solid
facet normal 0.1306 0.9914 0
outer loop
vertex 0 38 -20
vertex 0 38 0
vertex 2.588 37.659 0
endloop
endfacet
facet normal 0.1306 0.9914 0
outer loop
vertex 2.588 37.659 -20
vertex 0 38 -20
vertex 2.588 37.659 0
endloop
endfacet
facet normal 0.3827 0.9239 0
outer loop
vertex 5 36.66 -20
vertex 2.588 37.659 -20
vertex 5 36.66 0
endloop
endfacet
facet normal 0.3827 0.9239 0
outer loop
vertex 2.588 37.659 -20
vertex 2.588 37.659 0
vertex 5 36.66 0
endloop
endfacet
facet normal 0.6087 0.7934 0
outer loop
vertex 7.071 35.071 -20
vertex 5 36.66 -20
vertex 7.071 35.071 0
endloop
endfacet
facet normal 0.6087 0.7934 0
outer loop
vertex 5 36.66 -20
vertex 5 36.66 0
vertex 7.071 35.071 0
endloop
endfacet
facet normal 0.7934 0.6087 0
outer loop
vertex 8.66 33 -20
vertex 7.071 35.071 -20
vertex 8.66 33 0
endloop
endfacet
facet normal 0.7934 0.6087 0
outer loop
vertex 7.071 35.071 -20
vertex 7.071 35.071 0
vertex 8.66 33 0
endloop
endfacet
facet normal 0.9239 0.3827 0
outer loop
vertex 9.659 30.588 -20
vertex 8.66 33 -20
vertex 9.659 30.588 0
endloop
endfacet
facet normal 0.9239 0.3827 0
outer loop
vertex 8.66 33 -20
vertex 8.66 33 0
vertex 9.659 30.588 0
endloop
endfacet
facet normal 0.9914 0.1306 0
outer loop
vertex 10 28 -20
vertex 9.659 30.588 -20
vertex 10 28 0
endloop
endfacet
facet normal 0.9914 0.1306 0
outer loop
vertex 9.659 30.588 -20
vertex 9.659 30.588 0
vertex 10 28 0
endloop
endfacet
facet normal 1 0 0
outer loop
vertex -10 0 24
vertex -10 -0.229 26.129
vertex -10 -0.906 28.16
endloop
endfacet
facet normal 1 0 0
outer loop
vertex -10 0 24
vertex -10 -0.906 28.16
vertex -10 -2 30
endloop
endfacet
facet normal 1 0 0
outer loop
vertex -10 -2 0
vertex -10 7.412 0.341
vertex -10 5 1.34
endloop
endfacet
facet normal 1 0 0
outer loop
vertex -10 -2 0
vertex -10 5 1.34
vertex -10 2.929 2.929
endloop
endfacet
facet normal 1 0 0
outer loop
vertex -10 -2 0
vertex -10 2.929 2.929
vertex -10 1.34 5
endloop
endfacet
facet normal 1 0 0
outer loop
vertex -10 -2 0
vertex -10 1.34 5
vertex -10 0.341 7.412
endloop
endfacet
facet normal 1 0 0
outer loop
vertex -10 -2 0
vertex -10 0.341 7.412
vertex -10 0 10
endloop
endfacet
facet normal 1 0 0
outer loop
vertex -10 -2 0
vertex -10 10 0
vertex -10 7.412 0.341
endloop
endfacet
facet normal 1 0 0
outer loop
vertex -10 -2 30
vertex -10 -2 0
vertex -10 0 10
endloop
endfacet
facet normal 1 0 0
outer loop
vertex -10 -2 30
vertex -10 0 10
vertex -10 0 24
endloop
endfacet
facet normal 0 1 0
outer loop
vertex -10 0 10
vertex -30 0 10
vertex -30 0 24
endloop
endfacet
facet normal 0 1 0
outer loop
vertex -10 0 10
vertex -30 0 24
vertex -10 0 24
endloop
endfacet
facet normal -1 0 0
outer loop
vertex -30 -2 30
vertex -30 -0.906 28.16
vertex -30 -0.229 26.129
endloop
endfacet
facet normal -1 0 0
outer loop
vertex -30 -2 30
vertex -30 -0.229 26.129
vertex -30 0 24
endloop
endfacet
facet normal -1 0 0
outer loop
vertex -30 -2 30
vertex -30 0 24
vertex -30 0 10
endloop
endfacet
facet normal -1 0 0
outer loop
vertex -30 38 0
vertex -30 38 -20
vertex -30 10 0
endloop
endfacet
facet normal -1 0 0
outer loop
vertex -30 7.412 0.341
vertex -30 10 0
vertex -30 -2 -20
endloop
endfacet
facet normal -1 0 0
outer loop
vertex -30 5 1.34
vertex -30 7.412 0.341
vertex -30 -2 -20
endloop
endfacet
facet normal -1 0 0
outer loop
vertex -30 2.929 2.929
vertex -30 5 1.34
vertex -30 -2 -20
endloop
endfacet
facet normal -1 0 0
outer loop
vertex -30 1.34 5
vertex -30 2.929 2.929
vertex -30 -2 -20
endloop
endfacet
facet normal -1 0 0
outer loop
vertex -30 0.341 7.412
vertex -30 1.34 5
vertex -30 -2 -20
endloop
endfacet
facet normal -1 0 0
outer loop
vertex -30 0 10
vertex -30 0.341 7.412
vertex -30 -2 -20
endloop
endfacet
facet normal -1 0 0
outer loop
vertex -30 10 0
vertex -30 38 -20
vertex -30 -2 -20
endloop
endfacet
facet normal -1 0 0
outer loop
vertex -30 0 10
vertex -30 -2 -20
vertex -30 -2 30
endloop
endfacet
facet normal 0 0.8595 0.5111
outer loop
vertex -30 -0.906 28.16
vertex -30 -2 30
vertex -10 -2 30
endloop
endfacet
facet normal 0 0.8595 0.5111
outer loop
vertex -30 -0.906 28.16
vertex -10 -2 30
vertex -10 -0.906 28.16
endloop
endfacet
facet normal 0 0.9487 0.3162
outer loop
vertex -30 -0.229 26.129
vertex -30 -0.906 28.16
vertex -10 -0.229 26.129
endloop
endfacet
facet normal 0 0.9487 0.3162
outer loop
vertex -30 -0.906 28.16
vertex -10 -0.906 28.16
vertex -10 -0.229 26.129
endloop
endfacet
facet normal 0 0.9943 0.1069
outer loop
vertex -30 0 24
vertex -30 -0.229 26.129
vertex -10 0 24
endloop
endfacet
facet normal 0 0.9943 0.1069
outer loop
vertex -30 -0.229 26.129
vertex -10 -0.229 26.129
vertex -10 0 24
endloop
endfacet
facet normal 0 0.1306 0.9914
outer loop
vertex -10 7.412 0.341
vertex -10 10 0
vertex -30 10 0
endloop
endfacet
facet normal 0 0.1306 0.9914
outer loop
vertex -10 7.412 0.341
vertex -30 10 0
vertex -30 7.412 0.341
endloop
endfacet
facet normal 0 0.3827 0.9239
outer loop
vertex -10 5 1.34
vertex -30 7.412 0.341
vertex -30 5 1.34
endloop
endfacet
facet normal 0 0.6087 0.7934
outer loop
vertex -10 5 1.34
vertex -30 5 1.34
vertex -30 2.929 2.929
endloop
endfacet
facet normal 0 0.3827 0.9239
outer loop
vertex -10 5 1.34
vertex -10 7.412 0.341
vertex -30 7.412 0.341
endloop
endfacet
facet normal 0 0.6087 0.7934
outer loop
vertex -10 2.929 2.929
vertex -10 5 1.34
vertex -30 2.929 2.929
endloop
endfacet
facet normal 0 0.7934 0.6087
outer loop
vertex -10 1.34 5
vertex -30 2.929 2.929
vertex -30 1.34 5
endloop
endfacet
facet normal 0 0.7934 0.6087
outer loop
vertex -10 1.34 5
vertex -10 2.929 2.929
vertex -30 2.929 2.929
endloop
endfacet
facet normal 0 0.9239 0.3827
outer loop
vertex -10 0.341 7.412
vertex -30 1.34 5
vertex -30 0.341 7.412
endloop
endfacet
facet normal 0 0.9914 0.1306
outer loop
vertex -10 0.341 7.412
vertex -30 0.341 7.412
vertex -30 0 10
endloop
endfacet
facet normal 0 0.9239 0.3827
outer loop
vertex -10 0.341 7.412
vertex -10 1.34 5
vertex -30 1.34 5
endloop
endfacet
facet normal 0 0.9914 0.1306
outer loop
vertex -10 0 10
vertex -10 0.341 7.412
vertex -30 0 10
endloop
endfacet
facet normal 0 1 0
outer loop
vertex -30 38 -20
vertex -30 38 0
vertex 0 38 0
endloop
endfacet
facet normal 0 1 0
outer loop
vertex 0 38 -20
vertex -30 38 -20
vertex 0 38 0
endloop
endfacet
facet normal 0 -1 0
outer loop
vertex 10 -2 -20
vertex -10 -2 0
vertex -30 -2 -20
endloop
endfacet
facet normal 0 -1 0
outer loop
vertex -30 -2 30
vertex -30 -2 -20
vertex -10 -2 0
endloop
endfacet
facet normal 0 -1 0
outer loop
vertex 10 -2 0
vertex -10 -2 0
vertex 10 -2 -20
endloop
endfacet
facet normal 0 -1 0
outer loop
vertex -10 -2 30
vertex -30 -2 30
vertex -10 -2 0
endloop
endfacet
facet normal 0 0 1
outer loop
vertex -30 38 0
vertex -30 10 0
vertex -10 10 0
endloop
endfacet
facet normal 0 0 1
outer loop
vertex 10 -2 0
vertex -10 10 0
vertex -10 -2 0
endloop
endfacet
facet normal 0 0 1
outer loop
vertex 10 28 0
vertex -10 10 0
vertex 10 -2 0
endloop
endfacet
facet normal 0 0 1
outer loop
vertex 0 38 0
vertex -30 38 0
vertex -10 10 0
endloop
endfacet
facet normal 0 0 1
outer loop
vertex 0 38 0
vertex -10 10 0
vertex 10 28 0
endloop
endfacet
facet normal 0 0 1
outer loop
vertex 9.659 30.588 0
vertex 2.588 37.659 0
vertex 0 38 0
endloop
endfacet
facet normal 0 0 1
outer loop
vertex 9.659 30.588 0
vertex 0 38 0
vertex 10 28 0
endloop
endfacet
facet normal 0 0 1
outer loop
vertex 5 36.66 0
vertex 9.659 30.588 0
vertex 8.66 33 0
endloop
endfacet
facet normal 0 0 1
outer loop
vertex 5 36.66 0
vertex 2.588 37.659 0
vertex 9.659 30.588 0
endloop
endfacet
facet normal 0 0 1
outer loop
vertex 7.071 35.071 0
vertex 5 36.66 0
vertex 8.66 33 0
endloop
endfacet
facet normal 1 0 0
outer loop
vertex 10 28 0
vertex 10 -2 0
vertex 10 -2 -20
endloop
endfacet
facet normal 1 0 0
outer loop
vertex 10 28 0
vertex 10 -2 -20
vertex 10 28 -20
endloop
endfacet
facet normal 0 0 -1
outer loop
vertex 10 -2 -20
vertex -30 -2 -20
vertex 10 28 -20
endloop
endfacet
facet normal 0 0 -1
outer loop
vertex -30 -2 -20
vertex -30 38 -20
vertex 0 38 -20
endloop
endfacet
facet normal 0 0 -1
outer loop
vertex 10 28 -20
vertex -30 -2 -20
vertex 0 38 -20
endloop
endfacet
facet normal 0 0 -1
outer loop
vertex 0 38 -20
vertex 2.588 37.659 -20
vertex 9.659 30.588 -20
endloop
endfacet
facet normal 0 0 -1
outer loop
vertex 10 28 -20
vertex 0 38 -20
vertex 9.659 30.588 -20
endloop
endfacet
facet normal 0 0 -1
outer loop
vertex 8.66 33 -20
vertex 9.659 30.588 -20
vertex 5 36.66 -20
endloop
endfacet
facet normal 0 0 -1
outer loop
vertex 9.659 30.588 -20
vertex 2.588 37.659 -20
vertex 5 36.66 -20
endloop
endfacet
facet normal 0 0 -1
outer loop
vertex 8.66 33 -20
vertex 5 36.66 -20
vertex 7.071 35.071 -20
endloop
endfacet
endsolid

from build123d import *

# Parameters (mm, degrees)
SKETCH1_W           = 20
SKETCH1_H           = 2
BOSS_EXTRUDE1_DEPTH = 30
SKETCH2_W           = 40
SKETCH2_H           = 40
BOSS_EXTRUDE2_DEPTH = 20
FILLET1_R           = 10


with BuildPart() as part:
    # Sketch1 → Boss-Extrude1 (new body)
    with BuildSketch(Plane.XY):
        with Locations((-20, -1)):
            Rectangle(SKETCH1_W, SKETCH1_H)
    extrude(amount=BOSS_EXTRUDE1_DEPTH)

    # Sketch2 → Boss-Extrude2 (add)
    with BuildSketch(Plane.XY):
        with Locations((-10, 18)):
            Rectangle(SKETCH2_W, SKETCH2_H)
    extrude(amount=-BOSS_EXTRUDE2_DEPTH)

    # Fillet1
    # the kernel refuses this fillet: 10 mm, written as the material it adds along each edge
    with BuildSketch(Plane(origin=(-10, 0, 0), x_dir=(0, 1, 0), z_dir=(-1, 0, 0))) as fillet1_piece_1:
        with BuildLine():
            CenterArc((FILLET1_R, -FILLET1_R), FILLET1_R, 90, 90)
            Line((0, -FILLET1_R), (0, 0))
            Line((0, 0), (FILLET1_R, 0))
        make_face()
    extrude(amount=20)
    # the kernel refuses this fillet: 10 mm, written as the material it takes off along each edge
    with BuildSketch(Plane(origin=(10, 38, 25), x_dir=(-1, 0, 0), z_dir=(0, 0, -1))) as fillet1_2_piece_1:
        with BuildLine():
            CenterArc((FILLET1_R, -FILLET1_R), FILLET1_R, 90, 90)
            Line((0, -FILLET1_R), (0, 0))
            Line((0, 0), (FILLET1_R, 0))
        make_face()
    extrude(amount=70, mode=Mode.SUBTRACT)
    with BuildSketch(Plane(origin=(5, 0, 30), x_dir=(0, 0, -1), z_dir=(-1, 0, 0))) as fillet1_2_piece_2:
        with BuildLine():
            CenterArc((6, 10), FILLET1_R, 233.130102354, 36.869897646)
            Line((0, 2), (0, 0))
            Line((0, 0), (6, 0))
        make_face()
    extrude(amount=50, mode=Mode.SUBTRACT)


solid = part.part
